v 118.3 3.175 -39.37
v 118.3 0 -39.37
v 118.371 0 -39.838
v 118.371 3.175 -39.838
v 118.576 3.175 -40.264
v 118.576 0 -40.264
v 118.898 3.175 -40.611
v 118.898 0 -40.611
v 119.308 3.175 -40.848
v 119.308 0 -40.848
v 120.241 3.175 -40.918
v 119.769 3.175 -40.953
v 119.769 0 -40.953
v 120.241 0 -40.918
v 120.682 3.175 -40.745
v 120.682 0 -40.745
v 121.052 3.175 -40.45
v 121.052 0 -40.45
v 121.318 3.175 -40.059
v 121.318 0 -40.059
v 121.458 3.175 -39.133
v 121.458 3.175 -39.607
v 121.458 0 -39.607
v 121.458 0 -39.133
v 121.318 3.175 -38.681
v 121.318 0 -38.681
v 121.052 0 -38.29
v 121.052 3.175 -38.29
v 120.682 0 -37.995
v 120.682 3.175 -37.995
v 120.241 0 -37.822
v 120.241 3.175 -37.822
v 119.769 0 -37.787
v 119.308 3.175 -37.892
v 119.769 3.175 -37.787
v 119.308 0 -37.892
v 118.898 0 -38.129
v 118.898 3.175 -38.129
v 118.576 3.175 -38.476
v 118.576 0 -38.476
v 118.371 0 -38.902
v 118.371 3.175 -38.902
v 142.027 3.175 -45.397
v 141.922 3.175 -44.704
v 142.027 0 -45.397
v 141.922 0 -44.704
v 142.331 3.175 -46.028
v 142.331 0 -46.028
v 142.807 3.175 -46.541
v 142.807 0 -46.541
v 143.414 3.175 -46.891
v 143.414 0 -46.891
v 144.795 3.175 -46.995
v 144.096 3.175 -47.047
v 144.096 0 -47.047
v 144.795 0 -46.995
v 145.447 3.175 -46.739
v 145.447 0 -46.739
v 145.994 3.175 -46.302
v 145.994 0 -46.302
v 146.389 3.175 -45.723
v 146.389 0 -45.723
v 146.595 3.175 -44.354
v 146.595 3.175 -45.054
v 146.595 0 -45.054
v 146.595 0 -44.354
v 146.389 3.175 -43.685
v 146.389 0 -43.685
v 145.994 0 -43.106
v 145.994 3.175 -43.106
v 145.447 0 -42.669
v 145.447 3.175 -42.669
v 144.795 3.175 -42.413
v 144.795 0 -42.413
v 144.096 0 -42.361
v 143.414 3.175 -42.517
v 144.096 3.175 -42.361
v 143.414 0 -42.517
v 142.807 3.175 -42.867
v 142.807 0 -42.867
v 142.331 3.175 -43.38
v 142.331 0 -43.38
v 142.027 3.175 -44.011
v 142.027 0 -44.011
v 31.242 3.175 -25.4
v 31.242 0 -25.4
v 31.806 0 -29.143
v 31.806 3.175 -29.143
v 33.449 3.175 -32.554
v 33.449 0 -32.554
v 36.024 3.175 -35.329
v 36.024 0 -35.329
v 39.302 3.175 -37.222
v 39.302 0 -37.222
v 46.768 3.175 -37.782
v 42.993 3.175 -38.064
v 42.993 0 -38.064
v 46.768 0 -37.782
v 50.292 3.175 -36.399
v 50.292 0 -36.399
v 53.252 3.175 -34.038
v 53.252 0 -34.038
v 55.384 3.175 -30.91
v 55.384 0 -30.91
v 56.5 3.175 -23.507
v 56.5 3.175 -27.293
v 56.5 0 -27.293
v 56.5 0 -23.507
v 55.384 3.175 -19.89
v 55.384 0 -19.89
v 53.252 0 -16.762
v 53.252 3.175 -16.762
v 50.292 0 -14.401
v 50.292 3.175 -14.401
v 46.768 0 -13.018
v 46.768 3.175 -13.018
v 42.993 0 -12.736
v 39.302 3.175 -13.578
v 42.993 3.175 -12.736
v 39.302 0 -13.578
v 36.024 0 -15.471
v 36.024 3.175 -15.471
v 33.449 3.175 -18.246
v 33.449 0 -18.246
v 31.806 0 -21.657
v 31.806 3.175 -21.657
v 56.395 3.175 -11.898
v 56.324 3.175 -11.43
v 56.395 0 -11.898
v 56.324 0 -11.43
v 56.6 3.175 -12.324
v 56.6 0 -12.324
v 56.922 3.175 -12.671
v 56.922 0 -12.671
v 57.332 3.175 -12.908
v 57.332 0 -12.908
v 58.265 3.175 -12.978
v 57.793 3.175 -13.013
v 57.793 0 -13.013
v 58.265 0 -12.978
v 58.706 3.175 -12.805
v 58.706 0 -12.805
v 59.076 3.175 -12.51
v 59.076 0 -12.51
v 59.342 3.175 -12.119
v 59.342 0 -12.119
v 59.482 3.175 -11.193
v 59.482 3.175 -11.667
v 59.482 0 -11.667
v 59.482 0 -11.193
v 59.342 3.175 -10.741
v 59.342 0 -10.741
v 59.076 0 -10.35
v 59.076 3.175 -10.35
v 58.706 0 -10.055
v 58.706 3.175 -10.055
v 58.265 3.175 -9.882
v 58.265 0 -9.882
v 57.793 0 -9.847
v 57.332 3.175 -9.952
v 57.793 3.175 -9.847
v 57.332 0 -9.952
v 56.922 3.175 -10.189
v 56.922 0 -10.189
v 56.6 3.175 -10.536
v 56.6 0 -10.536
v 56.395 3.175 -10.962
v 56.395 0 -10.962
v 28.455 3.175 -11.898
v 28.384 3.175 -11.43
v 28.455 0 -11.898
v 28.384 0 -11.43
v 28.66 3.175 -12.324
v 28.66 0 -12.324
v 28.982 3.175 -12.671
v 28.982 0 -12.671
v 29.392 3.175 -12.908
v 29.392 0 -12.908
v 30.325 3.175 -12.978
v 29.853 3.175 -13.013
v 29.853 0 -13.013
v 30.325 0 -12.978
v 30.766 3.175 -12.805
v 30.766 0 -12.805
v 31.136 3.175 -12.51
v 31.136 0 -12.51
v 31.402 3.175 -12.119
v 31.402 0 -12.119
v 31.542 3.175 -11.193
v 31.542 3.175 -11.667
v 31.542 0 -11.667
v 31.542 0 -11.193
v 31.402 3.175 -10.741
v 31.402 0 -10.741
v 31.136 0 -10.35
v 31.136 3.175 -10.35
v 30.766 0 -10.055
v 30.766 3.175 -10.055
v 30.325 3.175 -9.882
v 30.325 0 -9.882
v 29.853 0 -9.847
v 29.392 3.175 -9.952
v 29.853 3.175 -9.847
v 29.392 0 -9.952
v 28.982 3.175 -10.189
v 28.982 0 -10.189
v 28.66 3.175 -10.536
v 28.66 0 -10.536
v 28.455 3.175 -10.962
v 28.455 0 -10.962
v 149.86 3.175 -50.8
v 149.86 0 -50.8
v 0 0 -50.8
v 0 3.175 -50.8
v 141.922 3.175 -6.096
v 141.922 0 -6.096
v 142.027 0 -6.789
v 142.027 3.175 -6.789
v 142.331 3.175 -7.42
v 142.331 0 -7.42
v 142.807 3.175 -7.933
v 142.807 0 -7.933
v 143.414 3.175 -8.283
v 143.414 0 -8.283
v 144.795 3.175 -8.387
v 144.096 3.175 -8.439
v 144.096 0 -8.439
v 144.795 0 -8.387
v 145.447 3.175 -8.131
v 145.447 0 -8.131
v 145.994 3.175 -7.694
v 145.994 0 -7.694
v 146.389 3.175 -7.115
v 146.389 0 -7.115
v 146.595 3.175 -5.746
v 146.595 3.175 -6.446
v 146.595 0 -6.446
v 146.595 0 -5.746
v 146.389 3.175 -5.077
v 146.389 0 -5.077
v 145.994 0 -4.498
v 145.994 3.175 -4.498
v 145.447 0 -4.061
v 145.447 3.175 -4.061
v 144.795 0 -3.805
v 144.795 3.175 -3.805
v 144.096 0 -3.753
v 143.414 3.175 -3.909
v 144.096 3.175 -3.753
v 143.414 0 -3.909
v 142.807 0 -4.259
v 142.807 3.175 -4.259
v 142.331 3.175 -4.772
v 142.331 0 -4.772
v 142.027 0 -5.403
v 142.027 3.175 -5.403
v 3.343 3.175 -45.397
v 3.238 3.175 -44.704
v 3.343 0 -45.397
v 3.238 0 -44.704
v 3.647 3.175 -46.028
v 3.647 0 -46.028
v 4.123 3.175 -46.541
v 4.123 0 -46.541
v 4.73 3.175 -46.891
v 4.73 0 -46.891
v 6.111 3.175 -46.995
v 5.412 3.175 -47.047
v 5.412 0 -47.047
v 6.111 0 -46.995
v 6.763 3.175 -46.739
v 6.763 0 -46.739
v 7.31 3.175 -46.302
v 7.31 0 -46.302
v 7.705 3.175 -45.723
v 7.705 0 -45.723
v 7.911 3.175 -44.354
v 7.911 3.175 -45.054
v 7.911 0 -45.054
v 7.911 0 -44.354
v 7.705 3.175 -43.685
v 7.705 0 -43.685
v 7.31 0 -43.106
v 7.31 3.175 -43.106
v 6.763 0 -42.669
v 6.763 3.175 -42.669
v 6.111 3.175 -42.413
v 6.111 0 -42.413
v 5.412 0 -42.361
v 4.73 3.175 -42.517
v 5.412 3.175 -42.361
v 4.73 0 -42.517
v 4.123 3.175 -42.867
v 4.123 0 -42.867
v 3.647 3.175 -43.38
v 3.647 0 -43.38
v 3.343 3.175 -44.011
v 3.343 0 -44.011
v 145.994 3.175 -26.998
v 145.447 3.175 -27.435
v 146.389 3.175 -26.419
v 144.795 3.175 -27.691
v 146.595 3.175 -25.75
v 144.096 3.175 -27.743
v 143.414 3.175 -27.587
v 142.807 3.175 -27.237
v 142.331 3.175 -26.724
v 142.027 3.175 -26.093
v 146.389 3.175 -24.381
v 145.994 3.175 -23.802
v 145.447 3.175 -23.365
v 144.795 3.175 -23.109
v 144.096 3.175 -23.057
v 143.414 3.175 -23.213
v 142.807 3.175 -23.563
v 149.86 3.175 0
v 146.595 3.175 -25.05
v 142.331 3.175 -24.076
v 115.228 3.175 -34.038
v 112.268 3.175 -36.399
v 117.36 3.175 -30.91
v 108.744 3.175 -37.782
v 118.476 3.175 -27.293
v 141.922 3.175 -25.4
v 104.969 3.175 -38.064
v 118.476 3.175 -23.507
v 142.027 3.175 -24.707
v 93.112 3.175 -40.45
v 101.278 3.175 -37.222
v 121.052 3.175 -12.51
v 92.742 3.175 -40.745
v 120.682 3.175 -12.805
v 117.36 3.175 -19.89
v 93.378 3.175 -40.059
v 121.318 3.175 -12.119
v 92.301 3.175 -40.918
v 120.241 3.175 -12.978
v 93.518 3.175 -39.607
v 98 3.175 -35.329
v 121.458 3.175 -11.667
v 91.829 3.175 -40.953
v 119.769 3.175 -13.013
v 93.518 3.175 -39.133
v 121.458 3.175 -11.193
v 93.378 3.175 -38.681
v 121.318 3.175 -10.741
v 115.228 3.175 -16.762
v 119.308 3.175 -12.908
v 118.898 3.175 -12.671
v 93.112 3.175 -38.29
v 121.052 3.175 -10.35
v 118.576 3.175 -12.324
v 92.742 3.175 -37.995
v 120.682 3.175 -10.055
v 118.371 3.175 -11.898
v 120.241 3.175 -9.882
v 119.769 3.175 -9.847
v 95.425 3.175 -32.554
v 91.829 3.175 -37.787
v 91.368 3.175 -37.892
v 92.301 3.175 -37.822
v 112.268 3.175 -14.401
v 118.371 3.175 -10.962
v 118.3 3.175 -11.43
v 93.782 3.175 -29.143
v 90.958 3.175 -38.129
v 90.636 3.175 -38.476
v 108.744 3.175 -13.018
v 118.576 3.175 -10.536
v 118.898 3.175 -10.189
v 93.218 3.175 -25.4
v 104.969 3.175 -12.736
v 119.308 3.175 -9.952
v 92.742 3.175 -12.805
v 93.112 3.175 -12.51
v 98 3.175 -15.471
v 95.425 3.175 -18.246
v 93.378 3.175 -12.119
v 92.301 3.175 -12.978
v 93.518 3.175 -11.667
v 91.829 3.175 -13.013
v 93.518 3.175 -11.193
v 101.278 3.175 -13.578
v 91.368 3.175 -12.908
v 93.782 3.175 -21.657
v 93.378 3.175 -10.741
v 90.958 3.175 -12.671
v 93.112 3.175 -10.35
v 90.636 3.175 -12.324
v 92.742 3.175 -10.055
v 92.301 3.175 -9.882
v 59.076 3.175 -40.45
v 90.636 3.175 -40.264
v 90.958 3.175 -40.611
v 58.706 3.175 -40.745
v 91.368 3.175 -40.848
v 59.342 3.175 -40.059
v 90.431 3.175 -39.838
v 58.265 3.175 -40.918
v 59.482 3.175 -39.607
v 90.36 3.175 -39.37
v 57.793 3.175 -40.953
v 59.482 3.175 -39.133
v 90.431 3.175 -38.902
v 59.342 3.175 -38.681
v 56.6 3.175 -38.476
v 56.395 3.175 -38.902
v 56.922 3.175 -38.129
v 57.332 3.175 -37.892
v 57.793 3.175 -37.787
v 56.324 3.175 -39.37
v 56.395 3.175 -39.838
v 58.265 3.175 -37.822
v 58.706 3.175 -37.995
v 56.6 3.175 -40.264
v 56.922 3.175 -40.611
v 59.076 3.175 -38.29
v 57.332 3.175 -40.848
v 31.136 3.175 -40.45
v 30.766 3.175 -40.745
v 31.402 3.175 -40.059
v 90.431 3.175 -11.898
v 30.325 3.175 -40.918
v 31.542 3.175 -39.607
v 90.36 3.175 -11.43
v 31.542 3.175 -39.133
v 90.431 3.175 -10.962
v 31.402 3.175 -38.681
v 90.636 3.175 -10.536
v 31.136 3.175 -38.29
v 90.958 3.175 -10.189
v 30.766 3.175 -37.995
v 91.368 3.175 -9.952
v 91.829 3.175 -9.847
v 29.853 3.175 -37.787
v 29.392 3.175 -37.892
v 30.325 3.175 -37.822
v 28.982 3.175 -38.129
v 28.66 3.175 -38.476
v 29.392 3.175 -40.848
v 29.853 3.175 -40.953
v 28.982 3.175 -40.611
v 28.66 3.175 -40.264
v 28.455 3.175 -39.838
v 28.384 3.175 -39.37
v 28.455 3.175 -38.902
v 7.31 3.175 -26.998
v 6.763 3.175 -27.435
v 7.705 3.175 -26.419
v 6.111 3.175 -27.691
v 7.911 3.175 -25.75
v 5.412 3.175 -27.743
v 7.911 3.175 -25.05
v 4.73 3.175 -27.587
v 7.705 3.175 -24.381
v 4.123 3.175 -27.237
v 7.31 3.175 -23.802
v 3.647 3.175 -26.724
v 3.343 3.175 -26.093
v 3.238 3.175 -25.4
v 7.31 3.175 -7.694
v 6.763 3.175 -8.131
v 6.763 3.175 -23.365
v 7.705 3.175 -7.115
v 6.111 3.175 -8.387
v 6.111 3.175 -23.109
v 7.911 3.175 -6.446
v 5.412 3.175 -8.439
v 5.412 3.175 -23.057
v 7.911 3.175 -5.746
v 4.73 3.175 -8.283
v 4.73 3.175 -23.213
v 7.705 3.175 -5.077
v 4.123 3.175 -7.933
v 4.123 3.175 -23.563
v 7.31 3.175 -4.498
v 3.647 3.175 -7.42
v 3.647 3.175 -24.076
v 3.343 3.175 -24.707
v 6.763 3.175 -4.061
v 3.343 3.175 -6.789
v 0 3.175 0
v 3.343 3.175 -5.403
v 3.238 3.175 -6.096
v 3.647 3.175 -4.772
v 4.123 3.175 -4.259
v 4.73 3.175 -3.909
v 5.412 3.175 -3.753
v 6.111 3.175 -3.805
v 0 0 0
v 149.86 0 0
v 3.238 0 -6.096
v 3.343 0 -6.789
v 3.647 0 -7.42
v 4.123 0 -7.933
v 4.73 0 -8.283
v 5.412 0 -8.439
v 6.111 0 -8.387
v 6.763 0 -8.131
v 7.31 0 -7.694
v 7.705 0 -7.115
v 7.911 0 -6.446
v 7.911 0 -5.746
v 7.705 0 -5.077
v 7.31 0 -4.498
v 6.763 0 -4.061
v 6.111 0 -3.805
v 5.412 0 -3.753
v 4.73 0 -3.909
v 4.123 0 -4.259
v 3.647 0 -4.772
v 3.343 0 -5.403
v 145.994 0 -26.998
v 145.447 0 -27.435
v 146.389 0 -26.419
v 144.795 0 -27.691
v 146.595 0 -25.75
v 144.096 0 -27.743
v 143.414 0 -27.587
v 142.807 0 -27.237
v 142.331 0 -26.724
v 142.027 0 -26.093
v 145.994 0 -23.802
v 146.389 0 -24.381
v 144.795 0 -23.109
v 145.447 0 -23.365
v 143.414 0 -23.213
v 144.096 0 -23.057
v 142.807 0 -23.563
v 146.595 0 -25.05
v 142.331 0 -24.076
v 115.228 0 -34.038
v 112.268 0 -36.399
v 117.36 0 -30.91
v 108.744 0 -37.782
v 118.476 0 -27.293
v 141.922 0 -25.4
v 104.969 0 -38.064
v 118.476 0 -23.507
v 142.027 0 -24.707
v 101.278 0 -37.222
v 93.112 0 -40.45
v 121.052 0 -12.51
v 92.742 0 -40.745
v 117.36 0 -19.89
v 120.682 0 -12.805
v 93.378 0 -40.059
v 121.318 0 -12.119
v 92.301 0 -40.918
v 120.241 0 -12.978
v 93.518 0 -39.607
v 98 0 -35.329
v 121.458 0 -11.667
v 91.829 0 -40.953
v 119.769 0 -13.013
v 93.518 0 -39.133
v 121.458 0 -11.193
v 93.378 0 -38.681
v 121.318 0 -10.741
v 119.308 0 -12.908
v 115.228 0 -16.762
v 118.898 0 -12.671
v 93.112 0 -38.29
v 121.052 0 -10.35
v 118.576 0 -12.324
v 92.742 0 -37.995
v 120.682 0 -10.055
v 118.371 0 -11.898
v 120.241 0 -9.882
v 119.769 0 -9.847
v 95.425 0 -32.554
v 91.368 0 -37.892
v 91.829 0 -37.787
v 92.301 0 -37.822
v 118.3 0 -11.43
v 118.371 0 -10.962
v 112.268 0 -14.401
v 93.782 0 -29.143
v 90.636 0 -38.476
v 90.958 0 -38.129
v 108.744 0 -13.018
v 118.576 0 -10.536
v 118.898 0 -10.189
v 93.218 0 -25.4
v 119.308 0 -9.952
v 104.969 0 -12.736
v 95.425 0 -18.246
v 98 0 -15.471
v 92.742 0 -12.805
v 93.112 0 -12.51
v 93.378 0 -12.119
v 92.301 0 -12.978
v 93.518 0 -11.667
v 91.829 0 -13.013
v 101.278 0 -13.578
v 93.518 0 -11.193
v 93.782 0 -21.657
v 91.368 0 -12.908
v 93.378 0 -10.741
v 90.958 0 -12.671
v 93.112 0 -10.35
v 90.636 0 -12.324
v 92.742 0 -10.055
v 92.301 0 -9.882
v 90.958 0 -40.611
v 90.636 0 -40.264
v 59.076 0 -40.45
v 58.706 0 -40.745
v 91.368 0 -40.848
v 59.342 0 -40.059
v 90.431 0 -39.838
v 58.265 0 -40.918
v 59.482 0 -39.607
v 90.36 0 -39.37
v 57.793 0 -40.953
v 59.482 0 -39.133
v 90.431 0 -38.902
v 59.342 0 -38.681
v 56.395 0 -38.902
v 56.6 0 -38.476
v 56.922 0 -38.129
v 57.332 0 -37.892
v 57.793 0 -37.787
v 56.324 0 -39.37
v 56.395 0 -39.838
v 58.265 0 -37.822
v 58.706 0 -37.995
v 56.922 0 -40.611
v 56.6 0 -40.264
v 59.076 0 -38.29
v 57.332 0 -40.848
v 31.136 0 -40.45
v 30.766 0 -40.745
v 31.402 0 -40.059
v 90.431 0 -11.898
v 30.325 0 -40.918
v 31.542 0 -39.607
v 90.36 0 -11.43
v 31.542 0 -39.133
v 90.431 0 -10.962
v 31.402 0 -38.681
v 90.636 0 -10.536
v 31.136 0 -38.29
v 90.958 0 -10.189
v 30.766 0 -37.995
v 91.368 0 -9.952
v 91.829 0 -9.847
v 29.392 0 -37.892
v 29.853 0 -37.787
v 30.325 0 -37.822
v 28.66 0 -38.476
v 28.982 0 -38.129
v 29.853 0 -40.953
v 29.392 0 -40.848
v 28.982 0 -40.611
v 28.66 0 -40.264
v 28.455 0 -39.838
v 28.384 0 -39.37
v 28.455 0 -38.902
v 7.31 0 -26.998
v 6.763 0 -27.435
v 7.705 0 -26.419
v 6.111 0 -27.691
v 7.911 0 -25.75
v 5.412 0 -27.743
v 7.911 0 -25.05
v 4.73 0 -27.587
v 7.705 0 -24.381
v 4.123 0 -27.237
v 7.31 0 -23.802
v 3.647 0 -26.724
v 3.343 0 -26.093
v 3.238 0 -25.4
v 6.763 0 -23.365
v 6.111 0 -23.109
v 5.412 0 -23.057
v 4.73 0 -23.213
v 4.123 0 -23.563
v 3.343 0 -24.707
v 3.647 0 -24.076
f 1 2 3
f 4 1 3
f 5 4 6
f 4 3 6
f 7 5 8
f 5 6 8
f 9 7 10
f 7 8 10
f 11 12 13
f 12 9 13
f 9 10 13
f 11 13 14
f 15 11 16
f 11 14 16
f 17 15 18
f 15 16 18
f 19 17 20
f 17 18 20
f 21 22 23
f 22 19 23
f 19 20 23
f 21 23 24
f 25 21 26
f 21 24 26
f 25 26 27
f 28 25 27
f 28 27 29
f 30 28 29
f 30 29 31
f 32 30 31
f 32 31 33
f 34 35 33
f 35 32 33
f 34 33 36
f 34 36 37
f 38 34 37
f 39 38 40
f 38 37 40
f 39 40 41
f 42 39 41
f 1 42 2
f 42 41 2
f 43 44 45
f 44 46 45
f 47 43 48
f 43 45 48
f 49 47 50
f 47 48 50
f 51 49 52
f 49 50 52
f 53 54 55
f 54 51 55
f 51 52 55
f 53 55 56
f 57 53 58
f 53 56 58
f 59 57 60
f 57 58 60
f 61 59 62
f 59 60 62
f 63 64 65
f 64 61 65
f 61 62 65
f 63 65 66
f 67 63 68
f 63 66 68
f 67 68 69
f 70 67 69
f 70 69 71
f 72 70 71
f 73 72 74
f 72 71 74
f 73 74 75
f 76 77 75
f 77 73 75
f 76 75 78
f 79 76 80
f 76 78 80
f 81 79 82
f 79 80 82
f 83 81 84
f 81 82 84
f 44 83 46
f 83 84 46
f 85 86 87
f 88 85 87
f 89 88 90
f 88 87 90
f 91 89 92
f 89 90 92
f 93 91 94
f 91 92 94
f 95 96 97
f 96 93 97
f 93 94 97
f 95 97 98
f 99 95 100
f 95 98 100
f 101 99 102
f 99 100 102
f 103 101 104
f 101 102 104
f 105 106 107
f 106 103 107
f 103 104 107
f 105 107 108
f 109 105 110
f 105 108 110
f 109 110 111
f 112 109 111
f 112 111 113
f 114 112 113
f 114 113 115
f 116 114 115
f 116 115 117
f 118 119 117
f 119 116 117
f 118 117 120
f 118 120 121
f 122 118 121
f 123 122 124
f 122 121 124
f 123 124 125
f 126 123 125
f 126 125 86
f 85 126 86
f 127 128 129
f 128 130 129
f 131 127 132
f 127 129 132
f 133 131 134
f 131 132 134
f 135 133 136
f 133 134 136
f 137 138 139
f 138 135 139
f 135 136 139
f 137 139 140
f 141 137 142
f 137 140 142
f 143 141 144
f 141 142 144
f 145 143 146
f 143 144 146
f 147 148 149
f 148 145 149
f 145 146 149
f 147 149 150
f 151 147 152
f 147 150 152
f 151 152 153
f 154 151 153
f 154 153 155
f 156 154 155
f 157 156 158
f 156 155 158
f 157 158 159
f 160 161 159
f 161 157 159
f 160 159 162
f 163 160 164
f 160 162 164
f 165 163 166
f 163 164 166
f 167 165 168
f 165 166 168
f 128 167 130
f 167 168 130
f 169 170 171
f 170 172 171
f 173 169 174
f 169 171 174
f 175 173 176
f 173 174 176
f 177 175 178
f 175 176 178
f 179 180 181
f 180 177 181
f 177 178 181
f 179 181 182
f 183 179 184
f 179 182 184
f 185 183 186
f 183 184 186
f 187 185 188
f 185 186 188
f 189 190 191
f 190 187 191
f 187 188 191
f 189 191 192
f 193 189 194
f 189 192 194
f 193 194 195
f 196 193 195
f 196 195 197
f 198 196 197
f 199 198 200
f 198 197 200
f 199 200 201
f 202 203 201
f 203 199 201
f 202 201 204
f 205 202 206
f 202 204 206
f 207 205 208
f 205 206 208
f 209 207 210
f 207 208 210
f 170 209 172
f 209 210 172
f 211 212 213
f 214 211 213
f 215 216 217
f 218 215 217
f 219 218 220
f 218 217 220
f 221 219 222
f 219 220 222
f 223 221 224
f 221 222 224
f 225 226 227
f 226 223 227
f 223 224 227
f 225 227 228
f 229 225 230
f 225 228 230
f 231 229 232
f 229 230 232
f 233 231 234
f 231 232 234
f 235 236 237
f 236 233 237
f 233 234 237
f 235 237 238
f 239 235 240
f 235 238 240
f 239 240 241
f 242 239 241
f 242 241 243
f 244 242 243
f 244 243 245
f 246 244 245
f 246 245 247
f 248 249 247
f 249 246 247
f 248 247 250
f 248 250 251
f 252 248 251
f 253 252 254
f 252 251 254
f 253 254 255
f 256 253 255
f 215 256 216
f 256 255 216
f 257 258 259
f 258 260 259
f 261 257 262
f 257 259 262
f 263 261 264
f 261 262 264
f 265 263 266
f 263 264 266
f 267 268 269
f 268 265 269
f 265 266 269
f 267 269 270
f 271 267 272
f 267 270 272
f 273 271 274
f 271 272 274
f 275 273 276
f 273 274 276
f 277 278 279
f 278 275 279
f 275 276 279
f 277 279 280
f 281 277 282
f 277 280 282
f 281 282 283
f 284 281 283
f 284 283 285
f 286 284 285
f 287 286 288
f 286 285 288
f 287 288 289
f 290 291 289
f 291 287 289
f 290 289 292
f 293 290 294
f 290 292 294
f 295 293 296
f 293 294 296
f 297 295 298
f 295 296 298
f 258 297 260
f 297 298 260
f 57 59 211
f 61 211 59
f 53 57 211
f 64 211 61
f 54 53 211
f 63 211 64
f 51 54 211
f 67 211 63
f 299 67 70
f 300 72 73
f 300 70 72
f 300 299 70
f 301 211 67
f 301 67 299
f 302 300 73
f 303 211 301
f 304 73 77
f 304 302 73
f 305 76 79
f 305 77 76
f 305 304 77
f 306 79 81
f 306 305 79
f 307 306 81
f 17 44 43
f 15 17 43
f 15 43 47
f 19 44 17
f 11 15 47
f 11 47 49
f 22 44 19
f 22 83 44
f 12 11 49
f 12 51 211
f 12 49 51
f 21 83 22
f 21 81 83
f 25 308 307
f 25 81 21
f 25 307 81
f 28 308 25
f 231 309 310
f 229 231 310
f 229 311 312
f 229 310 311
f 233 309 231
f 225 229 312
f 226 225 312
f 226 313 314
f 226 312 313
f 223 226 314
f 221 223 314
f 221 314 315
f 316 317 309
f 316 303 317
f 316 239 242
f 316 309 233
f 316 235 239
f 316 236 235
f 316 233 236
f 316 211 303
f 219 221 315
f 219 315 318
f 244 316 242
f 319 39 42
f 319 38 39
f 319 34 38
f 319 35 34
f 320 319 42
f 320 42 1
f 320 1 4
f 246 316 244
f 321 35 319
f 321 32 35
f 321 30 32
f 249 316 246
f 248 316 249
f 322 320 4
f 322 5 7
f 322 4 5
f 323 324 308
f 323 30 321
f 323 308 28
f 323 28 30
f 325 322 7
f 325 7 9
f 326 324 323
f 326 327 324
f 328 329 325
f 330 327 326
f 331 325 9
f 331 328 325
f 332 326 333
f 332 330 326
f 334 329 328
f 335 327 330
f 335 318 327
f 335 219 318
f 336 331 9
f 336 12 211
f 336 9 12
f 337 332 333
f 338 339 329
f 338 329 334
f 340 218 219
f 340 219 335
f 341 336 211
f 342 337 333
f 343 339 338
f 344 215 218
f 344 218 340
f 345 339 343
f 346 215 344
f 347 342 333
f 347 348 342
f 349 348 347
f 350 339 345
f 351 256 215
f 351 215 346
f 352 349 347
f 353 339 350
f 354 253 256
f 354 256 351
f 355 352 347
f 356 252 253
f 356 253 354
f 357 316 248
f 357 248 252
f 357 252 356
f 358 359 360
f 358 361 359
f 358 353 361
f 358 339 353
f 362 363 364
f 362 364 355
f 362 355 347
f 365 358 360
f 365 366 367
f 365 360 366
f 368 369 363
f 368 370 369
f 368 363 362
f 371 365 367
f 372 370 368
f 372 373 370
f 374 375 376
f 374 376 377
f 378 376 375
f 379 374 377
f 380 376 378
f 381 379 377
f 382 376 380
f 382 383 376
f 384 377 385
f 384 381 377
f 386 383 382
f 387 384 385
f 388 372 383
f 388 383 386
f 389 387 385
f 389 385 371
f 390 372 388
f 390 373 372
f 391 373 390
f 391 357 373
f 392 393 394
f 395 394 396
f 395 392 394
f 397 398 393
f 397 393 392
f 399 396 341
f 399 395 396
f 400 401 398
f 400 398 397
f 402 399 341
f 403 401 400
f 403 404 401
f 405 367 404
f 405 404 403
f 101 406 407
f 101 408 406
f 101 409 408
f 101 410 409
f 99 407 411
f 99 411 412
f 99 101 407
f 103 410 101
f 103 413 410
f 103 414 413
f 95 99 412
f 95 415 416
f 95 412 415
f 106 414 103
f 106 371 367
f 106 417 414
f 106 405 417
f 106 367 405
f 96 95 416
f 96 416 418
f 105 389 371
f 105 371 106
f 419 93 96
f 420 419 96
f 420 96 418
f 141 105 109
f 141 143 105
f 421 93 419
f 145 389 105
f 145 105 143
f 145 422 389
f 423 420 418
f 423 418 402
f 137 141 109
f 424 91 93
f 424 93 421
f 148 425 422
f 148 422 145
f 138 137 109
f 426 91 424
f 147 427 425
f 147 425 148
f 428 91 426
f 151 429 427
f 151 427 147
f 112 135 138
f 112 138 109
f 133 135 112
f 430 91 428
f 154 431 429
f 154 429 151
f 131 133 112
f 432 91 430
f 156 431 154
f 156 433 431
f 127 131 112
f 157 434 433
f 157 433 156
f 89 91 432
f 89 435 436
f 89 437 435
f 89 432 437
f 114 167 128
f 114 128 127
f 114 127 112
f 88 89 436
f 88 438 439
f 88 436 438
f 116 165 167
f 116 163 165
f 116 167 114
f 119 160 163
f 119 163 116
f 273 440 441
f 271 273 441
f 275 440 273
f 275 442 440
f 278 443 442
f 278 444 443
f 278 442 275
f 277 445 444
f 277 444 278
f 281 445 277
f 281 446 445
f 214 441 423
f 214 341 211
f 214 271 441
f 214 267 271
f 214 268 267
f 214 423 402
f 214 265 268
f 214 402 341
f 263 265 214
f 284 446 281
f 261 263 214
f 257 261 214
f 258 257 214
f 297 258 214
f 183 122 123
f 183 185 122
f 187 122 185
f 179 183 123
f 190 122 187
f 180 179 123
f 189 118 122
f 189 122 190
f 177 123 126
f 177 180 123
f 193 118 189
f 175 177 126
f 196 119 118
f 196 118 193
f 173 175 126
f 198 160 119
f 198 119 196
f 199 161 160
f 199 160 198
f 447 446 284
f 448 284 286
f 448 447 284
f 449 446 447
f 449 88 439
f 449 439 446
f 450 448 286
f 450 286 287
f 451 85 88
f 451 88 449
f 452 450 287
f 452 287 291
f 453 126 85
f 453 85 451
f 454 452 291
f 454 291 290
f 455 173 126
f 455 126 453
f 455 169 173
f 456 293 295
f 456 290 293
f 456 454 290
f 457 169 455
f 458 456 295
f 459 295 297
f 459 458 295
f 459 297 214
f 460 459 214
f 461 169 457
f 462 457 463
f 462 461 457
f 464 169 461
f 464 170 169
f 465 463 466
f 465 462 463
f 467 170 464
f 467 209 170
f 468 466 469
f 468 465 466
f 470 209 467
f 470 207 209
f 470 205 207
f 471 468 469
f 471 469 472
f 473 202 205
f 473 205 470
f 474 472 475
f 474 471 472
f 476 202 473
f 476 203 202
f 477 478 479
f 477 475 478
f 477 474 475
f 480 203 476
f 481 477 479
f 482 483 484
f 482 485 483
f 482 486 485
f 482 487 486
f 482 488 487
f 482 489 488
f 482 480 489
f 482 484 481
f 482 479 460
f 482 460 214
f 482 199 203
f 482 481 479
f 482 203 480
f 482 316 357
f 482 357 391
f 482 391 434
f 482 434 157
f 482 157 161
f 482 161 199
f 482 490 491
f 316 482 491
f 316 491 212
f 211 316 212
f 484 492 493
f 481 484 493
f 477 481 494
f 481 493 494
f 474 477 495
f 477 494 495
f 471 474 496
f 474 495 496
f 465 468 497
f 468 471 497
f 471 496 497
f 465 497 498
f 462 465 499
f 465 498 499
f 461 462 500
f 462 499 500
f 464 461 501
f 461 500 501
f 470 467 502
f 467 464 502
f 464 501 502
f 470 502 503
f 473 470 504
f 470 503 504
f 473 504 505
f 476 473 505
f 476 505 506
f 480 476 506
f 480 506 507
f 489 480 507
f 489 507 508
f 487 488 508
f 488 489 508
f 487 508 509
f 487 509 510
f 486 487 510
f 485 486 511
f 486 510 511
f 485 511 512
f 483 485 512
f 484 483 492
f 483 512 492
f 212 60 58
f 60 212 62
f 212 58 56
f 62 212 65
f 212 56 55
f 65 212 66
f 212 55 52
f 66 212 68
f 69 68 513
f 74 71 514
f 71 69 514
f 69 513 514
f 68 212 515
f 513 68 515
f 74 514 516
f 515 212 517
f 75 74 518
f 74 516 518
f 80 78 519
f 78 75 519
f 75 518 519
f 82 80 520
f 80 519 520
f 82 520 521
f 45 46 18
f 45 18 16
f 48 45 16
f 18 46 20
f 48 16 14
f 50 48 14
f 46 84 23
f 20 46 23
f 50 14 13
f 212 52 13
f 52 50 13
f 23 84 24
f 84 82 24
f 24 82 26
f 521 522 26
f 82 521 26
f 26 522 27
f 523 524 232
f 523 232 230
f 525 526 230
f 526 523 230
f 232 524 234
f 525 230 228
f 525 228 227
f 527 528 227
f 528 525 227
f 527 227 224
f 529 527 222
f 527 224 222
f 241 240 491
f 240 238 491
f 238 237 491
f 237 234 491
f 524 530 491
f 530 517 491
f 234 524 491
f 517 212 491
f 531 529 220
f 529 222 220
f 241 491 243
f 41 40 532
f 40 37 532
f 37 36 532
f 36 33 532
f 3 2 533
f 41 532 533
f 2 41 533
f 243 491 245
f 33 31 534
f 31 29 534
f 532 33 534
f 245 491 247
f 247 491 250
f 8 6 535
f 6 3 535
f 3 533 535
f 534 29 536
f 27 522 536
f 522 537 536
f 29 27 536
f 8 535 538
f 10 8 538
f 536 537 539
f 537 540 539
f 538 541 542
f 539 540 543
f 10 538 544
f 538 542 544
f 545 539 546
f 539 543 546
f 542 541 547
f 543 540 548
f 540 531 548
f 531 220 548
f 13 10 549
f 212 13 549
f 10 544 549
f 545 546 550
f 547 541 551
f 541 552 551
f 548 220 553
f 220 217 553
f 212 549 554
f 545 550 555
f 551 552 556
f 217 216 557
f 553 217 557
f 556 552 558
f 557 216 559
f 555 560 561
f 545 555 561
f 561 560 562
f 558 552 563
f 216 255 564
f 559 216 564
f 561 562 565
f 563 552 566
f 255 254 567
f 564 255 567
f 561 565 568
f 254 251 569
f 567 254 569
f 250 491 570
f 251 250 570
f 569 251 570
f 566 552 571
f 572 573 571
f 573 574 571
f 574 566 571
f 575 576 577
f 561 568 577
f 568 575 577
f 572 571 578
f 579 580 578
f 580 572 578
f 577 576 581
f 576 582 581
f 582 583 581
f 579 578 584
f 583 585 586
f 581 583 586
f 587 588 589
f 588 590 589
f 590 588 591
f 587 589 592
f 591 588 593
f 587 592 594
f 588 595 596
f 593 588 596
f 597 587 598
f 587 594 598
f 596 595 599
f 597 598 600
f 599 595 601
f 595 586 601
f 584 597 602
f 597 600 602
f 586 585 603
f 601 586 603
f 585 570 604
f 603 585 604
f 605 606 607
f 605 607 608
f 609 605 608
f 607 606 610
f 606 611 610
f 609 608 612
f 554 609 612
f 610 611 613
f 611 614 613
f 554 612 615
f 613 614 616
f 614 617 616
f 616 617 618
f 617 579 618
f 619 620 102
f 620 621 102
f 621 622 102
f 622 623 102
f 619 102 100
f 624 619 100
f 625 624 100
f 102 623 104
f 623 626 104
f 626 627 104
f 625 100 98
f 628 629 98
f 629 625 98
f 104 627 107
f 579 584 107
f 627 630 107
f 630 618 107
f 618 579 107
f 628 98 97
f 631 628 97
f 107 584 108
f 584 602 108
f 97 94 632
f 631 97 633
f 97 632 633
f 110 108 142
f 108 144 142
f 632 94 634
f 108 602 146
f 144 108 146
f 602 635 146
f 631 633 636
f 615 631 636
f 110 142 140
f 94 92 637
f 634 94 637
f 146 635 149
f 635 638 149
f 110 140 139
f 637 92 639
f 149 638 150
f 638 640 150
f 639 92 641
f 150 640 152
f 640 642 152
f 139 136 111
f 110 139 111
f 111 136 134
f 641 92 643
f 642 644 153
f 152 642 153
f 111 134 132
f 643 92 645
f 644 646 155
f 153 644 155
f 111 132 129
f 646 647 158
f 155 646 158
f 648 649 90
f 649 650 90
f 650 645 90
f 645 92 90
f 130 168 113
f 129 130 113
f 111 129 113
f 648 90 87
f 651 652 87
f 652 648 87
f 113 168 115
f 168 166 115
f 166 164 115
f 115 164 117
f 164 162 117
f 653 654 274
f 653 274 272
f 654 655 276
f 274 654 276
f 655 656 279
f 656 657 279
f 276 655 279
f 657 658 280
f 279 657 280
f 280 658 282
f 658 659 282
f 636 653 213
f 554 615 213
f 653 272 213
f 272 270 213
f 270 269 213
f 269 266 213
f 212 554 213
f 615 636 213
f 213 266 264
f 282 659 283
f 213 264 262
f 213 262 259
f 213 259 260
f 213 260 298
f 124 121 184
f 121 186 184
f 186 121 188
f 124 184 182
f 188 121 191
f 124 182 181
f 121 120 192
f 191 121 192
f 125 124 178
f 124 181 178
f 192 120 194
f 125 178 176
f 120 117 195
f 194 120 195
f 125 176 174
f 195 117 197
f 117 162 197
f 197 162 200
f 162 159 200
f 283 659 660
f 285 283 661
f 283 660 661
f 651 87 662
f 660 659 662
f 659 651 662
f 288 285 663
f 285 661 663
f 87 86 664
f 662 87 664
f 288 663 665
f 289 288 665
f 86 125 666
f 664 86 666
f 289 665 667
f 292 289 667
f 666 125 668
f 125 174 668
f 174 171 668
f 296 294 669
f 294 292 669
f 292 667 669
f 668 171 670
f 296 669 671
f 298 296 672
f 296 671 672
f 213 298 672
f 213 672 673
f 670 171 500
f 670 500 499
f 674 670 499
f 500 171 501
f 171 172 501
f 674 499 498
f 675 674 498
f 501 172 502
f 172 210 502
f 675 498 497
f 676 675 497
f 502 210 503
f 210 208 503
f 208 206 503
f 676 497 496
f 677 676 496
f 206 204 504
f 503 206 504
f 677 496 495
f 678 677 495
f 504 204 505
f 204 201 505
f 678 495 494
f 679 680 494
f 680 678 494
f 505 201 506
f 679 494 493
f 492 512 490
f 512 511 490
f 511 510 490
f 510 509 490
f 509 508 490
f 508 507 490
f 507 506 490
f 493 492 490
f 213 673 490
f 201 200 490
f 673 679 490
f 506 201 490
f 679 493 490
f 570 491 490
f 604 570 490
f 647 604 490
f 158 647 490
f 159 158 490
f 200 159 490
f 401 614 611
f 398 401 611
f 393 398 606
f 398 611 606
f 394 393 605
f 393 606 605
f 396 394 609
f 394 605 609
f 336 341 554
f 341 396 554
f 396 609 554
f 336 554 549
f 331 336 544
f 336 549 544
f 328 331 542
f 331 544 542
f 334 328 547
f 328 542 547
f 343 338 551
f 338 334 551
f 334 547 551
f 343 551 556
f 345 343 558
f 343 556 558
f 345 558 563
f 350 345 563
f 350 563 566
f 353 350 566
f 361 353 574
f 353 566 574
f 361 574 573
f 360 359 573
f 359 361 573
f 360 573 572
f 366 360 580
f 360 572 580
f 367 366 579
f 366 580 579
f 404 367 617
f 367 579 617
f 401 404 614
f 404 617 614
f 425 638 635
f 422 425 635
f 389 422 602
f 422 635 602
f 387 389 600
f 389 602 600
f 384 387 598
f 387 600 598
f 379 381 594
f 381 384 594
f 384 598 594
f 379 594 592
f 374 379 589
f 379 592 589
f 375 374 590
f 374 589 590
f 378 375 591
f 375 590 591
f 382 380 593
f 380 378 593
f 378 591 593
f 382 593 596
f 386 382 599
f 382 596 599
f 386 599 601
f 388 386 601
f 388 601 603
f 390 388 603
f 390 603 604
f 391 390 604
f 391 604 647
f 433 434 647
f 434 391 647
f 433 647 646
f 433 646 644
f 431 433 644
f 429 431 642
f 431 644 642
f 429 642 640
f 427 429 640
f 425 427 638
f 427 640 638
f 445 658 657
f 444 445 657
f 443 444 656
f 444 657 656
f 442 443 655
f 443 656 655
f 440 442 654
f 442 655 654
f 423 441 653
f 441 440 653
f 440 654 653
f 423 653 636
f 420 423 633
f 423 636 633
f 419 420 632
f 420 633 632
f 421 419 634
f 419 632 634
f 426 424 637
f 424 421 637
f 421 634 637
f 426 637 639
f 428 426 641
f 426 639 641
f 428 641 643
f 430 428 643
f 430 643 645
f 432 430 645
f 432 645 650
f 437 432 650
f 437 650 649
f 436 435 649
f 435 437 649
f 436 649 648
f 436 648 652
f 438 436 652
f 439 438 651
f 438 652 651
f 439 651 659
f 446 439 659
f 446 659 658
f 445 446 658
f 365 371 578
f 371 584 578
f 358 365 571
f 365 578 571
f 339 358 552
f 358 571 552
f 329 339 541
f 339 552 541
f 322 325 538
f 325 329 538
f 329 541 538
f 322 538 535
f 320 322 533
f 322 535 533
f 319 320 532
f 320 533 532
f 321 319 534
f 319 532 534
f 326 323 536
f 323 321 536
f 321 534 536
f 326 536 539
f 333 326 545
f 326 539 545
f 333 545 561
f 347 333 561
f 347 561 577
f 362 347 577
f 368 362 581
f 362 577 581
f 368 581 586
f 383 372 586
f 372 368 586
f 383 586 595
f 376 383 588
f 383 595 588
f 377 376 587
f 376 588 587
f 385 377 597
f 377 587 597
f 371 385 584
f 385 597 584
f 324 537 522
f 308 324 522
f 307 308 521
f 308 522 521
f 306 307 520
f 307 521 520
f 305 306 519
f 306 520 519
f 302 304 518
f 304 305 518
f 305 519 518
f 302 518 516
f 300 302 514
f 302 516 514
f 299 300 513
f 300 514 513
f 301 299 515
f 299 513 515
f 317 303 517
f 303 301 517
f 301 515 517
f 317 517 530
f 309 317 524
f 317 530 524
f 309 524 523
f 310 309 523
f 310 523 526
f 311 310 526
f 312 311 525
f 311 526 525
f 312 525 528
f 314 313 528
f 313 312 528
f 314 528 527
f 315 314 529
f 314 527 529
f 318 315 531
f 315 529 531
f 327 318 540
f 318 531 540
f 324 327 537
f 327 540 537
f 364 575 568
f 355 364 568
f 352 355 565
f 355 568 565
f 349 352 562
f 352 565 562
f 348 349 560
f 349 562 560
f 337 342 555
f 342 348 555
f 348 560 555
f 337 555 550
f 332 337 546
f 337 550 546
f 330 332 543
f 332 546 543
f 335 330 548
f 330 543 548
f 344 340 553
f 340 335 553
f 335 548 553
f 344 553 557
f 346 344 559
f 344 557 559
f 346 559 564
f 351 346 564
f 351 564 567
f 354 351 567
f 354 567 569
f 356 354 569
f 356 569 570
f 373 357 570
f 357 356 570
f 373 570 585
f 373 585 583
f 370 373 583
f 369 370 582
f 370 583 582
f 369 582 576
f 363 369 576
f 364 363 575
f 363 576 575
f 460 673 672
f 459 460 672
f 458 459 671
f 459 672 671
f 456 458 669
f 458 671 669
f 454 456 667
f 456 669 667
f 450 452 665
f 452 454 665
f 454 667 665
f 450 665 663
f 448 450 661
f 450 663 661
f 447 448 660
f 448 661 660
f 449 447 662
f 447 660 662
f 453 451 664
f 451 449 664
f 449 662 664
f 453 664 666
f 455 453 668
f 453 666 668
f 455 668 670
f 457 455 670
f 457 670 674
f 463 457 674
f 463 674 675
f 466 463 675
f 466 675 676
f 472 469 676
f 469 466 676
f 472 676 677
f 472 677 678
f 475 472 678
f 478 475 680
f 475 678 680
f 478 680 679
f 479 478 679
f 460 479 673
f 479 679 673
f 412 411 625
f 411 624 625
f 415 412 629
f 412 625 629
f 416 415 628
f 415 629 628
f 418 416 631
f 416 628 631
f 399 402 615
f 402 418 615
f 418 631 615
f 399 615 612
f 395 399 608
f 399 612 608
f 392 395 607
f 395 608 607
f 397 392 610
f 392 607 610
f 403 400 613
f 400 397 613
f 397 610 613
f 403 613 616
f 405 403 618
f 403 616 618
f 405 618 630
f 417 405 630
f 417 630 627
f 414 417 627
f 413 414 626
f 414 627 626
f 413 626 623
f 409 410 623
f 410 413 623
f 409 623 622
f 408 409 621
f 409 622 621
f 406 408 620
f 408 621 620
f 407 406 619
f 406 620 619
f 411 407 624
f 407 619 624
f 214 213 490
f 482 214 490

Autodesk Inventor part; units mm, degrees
ref_plane "YZ Plane" through (0, 0, 0) normal (1, 0, 0) x (0, 1, 0)
ref_plane "XZ Plane" through (0, 0, 0) normal (0, 1, 0) x (-1, 0, 0)
ref_plane "XY Plane" through (0, 0, 0) normal (0, 0, 1) x (1, 0, 0)
sketch "Sketch1" plane through (0, 0, 0) normal (0, 1, 0) x (-1, 0, 0)
  line L0 (0, 0) -> (-149.86, 0)
  line L1 (-149.86, 0) -> (-149.86, -50.8)
  line L2 (-149.86, -50.8) -> (0, -50.8)
  line L3 (0, -50.8) -> (0, 0)
  circle A0 centre (-43.942, -25.4) radius 12.7
  circle A1 centre (-29.972, -39.37) radius 1.5875
  circle A2 centre (-57.912, -39.37) radius 1.5875
  circle A3 centre (-57.912, -11.43) radius 1.5875
  circle A4 centre (-29.972, -11.43) radius 1.5875
  line L4 (-74.93, -50.8) -> (-74.93, 0) construction
  circle A5 centre (-5.588, -44.704) radius 2.3495
  circle A6 centre (-5.588, -25.4) radius 2.3495
  circle A7 centre (-5.588, -6.096) radius 2.3495
  circle A8 centre (-105.918, -25.4) radius 12.7
  circle A9 centre (-119.888, -39.37) radius 1.5875
  circle A10 centre (-91.948, -39.37) radius 1.5875
  circle A11 centre (-91.948, -11.43) radius 1.5875
  circle A12 centre (-119.888, -11.43) radius 1.5875
  circle A13 centre (-144.272, -44.704) radius 2.3495
  circle A14 centre (-144.272, -25.4) radius 2.3495
  circle A15 centre (-144.272, -6.096) radius 2.3495
  point P0 (-74.93, -25.4)
  dimension "d0" = 149.86
  dimension "d1" = 50.8
  dimension "d2" = 30.988
  dimension "d3" = 25.4
  dimension "d4" = 25.4
  dimension "d5" = 13.97
  dimension "d6" = 13.97
  dimension "d7" = 13.97
  dimension "d8" = 13.97
  dimension "d9" = 13.97
  dimension "d10" = 13.97
  dimension "d11" = 13.97
  dimension "d12" = 13.97
  dimension "d13" = 3.175
  dimension "d14" = 3.175
  dimension "d15" = 3.175
  dimension "d16" = 3.175
  dimension "d17" = 5.588
  dimension "d18" = 6.096
  dimension "d19" = 5.588
  dimension "d20" = 25.4
  dimension "d21" = 6.096
  dimension "d22" = 5.588
  dimension "d23" = 4.699
  dimension "d24" = 4.699
  dimension "d25" = 4.699
extrude "Extrusion1" add sketch "Sketch1" along normal blind 3.175
properties part number "3D Camera Mount 3"
